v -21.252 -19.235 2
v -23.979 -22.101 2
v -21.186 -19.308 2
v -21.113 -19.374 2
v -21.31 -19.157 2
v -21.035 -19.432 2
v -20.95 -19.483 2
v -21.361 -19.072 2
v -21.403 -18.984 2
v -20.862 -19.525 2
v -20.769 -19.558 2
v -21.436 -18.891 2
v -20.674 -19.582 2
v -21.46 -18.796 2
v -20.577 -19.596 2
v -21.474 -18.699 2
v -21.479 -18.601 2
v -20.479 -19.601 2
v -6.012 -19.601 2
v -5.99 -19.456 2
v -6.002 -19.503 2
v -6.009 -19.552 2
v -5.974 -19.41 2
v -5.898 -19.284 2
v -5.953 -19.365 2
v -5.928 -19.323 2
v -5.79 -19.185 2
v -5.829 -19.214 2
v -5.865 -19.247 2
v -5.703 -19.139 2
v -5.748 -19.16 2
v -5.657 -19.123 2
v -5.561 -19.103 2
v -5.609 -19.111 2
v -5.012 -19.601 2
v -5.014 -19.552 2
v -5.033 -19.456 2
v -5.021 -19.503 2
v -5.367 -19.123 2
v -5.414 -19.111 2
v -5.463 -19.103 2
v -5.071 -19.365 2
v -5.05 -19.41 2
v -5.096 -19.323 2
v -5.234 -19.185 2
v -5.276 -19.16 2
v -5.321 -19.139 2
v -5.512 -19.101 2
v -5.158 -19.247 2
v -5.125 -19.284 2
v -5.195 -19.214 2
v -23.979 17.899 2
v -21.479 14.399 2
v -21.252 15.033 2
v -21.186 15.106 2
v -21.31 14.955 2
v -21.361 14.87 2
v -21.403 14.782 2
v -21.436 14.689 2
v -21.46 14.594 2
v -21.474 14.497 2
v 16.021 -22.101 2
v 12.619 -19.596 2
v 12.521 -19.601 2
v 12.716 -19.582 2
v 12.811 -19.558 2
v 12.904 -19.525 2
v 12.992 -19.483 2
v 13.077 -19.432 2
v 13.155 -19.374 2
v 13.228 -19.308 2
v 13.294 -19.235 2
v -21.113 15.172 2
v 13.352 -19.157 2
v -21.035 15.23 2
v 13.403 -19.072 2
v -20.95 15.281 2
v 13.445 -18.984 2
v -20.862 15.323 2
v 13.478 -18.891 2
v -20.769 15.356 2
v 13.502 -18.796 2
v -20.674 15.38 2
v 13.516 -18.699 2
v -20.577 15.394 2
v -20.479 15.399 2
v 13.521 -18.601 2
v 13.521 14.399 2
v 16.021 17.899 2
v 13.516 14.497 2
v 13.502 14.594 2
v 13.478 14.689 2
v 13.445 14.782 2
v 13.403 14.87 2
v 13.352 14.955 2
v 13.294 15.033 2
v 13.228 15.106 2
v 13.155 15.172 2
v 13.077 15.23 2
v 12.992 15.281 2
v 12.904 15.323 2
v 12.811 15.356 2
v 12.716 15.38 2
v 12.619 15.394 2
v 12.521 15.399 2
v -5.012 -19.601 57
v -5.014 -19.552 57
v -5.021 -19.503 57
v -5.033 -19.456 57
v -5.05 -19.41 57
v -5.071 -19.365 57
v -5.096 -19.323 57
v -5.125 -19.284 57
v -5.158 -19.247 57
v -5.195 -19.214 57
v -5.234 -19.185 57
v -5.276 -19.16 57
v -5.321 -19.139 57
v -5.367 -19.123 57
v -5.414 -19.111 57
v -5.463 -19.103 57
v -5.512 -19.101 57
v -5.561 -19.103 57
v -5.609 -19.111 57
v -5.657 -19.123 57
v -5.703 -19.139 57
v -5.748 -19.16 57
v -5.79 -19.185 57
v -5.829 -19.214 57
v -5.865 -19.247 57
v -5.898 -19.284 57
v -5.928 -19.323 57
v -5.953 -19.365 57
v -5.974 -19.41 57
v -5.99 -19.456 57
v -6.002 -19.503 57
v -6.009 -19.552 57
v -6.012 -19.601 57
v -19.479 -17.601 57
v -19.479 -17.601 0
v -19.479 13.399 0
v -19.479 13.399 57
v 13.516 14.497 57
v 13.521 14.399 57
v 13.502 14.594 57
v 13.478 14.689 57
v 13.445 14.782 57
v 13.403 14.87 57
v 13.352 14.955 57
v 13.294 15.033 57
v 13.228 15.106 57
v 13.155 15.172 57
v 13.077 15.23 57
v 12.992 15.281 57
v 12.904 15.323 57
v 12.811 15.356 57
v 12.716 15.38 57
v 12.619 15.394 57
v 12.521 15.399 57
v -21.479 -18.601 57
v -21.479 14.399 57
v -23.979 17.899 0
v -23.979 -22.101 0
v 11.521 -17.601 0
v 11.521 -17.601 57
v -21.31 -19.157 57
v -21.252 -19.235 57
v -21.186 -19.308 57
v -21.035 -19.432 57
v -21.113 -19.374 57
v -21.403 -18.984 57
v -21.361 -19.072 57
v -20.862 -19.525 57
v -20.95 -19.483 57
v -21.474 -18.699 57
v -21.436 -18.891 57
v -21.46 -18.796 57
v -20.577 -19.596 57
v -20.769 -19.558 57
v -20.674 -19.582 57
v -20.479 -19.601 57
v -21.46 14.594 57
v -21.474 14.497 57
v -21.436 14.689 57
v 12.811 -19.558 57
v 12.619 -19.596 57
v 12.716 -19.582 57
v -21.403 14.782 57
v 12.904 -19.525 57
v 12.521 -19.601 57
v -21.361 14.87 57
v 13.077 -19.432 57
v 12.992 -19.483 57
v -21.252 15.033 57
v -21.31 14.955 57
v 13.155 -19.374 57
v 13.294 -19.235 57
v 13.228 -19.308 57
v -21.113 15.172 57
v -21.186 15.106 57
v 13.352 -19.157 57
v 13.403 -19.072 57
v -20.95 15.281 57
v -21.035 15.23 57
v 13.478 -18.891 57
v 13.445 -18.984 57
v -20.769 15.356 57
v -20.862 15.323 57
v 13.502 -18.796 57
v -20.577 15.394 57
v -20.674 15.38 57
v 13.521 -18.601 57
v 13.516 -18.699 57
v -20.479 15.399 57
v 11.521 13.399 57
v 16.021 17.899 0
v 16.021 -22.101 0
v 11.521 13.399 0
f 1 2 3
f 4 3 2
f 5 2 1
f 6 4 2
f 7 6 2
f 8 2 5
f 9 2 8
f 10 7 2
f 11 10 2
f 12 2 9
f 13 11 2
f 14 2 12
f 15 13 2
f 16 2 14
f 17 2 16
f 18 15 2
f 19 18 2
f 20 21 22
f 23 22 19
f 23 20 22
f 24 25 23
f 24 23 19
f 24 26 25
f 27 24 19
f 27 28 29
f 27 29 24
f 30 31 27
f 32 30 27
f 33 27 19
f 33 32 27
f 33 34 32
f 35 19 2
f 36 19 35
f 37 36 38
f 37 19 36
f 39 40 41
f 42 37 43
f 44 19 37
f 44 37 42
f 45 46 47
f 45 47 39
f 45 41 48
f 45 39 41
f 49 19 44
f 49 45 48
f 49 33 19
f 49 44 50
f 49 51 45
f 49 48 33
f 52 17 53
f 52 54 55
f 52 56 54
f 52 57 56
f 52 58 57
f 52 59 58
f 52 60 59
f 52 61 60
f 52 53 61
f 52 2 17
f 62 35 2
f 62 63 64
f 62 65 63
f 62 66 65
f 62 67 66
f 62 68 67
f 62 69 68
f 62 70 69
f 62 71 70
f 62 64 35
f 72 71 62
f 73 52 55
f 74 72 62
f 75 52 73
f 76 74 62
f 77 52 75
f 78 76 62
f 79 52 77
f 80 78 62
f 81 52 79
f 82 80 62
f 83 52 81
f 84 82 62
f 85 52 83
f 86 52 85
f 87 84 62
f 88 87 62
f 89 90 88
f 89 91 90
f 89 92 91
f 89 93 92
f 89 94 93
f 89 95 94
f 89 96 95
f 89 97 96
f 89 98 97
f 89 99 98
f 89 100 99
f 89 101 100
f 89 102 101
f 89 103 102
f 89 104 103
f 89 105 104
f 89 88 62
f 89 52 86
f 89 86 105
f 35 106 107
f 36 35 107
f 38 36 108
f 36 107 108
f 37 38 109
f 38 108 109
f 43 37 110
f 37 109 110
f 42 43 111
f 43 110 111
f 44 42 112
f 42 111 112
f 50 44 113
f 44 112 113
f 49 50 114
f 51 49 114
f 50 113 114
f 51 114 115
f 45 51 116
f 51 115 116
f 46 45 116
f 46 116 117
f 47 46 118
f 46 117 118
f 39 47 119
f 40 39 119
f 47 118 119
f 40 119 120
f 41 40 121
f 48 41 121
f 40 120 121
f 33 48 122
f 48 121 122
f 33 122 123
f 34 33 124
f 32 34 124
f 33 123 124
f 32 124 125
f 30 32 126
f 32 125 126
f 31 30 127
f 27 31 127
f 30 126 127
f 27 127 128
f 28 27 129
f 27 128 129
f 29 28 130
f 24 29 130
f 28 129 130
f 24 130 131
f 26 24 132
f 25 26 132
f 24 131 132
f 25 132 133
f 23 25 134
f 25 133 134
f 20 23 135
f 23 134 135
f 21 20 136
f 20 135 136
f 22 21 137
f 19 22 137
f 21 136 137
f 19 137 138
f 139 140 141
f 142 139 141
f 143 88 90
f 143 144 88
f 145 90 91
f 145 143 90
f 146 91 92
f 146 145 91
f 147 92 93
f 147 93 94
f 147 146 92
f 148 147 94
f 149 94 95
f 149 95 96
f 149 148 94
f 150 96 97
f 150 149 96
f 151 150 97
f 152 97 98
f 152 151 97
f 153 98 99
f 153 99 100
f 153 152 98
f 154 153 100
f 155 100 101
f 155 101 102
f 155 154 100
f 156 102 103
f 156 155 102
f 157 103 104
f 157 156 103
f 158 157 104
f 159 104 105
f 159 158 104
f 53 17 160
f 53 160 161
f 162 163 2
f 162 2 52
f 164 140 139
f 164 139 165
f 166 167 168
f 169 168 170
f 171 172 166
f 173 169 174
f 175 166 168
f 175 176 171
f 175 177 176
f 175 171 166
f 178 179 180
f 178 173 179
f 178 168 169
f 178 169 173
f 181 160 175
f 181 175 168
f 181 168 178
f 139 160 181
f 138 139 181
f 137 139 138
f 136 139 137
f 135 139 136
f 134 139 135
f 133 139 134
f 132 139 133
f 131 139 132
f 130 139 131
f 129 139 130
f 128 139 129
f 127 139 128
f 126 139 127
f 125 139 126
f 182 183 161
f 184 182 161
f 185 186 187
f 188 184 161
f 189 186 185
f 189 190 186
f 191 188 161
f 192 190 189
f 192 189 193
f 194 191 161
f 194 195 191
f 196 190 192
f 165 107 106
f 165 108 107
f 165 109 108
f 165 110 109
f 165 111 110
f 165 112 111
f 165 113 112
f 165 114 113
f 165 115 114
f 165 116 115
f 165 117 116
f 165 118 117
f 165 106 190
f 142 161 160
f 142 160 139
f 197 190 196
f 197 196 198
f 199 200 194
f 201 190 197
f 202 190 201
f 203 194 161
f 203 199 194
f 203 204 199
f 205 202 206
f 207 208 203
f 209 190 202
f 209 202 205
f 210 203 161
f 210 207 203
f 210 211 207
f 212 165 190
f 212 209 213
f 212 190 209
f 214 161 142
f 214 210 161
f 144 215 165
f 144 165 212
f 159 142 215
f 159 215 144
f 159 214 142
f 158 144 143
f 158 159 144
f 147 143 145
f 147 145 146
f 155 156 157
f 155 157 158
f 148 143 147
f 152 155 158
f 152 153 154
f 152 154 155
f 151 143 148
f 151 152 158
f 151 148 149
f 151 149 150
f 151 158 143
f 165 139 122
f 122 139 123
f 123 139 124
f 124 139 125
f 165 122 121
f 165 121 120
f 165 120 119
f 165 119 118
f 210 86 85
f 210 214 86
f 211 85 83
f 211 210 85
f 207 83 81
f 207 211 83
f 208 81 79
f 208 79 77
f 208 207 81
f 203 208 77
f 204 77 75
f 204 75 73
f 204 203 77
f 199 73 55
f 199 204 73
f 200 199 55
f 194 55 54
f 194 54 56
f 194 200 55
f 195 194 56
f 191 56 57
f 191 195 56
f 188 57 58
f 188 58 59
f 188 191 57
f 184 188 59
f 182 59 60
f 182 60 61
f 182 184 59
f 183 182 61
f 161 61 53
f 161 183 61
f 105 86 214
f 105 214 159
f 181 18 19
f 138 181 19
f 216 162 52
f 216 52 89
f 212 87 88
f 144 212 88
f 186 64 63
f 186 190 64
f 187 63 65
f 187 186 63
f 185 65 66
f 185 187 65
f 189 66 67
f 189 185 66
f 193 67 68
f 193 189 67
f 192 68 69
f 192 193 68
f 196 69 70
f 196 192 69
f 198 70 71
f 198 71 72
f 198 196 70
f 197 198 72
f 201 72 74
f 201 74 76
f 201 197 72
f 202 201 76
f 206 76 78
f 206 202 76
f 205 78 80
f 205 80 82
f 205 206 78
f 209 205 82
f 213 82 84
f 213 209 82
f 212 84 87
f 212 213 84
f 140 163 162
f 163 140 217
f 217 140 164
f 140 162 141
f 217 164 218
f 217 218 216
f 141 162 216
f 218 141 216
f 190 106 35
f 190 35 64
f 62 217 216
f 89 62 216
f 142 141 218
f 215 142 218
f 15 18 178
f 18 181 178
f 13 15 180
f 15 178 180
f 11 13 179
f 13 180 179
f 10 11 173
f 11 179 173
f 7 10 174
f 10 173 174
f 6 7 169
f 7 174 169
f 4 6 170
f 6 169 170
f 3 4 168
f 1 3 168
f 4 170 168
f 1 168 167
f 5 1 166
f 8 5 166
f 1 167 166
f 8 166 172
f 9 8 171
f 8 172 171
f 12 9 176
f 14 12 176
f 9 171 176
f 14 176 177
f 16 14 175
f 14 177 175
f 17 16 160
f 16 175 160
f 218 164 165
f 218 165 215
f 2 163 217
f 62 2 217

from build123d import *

# Parameters (mm, degrees)
F0_W     = 40
F0_H     = 40
F1_DEPTH = 2
F2_W     = 35
F2_H     = 35
F3_DEPTH = 55
F4_W     = 31
F4_H     = 31
F5_DEPTH = 57.001
F6_R     = 1
F8_DEPTH = 55


with BuildPart() as f1:
    # F0 (on Top) → F1 (new body)
    with BuildSketch(Plane.XY):
        with Locations((-3.9790219205, -2.1009873599)):
            Rectangle(F0_W, F0_H)
    extrude(amount=F1_DEPTH)

    # F2 (on face) → F3 (join)
    with BuildSketch(Plane.XY.offset(2)):
        with Locations((-3.9790219205, -2.1009873599)):
            Rectangle(F2_W, F2_H)
    extrude(amount=F3_DEPTH)

    # F4 (on face) → F5 (cut, through all)
    with BuildSketch(Plane.XY.offset(57)):
        with Locations((-3.9790219205, -2.1009873599)):
            Rectangle(F4_W, F4_H)
    extrude(amount=-F5_DEPTH, mode=Mode.SUBTRACT)

    # F6
    f6_edges = [f1.edges().sort_by_distance(p)[0] for p in [
        (13.520978, -19.600987, 29.5),
        (13.520978, 15.399013, 29.5),
        (-21.479022, -19.600987, 29.5),
        (-21.479022, 15.399013, 29.5),
    ]]
    fillet(f6_edges, radius=F6_R)

    # F7 (on face) → F8 (cut, through all)
    with BuildSketch(Plane.XY.offset(57)):
        with BuildLine():
            Line((-6.0118580349, -19.6009873599), (-5.0118580349, -19.6009873599))
            ThreePointArc((-5.0118580349, -19.6009873599), (-5.5118580349, -19.1009873599), (-6.0118580349, -19.6009873599))
        make_face()
    extrude(amount=-F8_DEPTH, mode=Mode.SUBTRACT)


solid = f1.part
